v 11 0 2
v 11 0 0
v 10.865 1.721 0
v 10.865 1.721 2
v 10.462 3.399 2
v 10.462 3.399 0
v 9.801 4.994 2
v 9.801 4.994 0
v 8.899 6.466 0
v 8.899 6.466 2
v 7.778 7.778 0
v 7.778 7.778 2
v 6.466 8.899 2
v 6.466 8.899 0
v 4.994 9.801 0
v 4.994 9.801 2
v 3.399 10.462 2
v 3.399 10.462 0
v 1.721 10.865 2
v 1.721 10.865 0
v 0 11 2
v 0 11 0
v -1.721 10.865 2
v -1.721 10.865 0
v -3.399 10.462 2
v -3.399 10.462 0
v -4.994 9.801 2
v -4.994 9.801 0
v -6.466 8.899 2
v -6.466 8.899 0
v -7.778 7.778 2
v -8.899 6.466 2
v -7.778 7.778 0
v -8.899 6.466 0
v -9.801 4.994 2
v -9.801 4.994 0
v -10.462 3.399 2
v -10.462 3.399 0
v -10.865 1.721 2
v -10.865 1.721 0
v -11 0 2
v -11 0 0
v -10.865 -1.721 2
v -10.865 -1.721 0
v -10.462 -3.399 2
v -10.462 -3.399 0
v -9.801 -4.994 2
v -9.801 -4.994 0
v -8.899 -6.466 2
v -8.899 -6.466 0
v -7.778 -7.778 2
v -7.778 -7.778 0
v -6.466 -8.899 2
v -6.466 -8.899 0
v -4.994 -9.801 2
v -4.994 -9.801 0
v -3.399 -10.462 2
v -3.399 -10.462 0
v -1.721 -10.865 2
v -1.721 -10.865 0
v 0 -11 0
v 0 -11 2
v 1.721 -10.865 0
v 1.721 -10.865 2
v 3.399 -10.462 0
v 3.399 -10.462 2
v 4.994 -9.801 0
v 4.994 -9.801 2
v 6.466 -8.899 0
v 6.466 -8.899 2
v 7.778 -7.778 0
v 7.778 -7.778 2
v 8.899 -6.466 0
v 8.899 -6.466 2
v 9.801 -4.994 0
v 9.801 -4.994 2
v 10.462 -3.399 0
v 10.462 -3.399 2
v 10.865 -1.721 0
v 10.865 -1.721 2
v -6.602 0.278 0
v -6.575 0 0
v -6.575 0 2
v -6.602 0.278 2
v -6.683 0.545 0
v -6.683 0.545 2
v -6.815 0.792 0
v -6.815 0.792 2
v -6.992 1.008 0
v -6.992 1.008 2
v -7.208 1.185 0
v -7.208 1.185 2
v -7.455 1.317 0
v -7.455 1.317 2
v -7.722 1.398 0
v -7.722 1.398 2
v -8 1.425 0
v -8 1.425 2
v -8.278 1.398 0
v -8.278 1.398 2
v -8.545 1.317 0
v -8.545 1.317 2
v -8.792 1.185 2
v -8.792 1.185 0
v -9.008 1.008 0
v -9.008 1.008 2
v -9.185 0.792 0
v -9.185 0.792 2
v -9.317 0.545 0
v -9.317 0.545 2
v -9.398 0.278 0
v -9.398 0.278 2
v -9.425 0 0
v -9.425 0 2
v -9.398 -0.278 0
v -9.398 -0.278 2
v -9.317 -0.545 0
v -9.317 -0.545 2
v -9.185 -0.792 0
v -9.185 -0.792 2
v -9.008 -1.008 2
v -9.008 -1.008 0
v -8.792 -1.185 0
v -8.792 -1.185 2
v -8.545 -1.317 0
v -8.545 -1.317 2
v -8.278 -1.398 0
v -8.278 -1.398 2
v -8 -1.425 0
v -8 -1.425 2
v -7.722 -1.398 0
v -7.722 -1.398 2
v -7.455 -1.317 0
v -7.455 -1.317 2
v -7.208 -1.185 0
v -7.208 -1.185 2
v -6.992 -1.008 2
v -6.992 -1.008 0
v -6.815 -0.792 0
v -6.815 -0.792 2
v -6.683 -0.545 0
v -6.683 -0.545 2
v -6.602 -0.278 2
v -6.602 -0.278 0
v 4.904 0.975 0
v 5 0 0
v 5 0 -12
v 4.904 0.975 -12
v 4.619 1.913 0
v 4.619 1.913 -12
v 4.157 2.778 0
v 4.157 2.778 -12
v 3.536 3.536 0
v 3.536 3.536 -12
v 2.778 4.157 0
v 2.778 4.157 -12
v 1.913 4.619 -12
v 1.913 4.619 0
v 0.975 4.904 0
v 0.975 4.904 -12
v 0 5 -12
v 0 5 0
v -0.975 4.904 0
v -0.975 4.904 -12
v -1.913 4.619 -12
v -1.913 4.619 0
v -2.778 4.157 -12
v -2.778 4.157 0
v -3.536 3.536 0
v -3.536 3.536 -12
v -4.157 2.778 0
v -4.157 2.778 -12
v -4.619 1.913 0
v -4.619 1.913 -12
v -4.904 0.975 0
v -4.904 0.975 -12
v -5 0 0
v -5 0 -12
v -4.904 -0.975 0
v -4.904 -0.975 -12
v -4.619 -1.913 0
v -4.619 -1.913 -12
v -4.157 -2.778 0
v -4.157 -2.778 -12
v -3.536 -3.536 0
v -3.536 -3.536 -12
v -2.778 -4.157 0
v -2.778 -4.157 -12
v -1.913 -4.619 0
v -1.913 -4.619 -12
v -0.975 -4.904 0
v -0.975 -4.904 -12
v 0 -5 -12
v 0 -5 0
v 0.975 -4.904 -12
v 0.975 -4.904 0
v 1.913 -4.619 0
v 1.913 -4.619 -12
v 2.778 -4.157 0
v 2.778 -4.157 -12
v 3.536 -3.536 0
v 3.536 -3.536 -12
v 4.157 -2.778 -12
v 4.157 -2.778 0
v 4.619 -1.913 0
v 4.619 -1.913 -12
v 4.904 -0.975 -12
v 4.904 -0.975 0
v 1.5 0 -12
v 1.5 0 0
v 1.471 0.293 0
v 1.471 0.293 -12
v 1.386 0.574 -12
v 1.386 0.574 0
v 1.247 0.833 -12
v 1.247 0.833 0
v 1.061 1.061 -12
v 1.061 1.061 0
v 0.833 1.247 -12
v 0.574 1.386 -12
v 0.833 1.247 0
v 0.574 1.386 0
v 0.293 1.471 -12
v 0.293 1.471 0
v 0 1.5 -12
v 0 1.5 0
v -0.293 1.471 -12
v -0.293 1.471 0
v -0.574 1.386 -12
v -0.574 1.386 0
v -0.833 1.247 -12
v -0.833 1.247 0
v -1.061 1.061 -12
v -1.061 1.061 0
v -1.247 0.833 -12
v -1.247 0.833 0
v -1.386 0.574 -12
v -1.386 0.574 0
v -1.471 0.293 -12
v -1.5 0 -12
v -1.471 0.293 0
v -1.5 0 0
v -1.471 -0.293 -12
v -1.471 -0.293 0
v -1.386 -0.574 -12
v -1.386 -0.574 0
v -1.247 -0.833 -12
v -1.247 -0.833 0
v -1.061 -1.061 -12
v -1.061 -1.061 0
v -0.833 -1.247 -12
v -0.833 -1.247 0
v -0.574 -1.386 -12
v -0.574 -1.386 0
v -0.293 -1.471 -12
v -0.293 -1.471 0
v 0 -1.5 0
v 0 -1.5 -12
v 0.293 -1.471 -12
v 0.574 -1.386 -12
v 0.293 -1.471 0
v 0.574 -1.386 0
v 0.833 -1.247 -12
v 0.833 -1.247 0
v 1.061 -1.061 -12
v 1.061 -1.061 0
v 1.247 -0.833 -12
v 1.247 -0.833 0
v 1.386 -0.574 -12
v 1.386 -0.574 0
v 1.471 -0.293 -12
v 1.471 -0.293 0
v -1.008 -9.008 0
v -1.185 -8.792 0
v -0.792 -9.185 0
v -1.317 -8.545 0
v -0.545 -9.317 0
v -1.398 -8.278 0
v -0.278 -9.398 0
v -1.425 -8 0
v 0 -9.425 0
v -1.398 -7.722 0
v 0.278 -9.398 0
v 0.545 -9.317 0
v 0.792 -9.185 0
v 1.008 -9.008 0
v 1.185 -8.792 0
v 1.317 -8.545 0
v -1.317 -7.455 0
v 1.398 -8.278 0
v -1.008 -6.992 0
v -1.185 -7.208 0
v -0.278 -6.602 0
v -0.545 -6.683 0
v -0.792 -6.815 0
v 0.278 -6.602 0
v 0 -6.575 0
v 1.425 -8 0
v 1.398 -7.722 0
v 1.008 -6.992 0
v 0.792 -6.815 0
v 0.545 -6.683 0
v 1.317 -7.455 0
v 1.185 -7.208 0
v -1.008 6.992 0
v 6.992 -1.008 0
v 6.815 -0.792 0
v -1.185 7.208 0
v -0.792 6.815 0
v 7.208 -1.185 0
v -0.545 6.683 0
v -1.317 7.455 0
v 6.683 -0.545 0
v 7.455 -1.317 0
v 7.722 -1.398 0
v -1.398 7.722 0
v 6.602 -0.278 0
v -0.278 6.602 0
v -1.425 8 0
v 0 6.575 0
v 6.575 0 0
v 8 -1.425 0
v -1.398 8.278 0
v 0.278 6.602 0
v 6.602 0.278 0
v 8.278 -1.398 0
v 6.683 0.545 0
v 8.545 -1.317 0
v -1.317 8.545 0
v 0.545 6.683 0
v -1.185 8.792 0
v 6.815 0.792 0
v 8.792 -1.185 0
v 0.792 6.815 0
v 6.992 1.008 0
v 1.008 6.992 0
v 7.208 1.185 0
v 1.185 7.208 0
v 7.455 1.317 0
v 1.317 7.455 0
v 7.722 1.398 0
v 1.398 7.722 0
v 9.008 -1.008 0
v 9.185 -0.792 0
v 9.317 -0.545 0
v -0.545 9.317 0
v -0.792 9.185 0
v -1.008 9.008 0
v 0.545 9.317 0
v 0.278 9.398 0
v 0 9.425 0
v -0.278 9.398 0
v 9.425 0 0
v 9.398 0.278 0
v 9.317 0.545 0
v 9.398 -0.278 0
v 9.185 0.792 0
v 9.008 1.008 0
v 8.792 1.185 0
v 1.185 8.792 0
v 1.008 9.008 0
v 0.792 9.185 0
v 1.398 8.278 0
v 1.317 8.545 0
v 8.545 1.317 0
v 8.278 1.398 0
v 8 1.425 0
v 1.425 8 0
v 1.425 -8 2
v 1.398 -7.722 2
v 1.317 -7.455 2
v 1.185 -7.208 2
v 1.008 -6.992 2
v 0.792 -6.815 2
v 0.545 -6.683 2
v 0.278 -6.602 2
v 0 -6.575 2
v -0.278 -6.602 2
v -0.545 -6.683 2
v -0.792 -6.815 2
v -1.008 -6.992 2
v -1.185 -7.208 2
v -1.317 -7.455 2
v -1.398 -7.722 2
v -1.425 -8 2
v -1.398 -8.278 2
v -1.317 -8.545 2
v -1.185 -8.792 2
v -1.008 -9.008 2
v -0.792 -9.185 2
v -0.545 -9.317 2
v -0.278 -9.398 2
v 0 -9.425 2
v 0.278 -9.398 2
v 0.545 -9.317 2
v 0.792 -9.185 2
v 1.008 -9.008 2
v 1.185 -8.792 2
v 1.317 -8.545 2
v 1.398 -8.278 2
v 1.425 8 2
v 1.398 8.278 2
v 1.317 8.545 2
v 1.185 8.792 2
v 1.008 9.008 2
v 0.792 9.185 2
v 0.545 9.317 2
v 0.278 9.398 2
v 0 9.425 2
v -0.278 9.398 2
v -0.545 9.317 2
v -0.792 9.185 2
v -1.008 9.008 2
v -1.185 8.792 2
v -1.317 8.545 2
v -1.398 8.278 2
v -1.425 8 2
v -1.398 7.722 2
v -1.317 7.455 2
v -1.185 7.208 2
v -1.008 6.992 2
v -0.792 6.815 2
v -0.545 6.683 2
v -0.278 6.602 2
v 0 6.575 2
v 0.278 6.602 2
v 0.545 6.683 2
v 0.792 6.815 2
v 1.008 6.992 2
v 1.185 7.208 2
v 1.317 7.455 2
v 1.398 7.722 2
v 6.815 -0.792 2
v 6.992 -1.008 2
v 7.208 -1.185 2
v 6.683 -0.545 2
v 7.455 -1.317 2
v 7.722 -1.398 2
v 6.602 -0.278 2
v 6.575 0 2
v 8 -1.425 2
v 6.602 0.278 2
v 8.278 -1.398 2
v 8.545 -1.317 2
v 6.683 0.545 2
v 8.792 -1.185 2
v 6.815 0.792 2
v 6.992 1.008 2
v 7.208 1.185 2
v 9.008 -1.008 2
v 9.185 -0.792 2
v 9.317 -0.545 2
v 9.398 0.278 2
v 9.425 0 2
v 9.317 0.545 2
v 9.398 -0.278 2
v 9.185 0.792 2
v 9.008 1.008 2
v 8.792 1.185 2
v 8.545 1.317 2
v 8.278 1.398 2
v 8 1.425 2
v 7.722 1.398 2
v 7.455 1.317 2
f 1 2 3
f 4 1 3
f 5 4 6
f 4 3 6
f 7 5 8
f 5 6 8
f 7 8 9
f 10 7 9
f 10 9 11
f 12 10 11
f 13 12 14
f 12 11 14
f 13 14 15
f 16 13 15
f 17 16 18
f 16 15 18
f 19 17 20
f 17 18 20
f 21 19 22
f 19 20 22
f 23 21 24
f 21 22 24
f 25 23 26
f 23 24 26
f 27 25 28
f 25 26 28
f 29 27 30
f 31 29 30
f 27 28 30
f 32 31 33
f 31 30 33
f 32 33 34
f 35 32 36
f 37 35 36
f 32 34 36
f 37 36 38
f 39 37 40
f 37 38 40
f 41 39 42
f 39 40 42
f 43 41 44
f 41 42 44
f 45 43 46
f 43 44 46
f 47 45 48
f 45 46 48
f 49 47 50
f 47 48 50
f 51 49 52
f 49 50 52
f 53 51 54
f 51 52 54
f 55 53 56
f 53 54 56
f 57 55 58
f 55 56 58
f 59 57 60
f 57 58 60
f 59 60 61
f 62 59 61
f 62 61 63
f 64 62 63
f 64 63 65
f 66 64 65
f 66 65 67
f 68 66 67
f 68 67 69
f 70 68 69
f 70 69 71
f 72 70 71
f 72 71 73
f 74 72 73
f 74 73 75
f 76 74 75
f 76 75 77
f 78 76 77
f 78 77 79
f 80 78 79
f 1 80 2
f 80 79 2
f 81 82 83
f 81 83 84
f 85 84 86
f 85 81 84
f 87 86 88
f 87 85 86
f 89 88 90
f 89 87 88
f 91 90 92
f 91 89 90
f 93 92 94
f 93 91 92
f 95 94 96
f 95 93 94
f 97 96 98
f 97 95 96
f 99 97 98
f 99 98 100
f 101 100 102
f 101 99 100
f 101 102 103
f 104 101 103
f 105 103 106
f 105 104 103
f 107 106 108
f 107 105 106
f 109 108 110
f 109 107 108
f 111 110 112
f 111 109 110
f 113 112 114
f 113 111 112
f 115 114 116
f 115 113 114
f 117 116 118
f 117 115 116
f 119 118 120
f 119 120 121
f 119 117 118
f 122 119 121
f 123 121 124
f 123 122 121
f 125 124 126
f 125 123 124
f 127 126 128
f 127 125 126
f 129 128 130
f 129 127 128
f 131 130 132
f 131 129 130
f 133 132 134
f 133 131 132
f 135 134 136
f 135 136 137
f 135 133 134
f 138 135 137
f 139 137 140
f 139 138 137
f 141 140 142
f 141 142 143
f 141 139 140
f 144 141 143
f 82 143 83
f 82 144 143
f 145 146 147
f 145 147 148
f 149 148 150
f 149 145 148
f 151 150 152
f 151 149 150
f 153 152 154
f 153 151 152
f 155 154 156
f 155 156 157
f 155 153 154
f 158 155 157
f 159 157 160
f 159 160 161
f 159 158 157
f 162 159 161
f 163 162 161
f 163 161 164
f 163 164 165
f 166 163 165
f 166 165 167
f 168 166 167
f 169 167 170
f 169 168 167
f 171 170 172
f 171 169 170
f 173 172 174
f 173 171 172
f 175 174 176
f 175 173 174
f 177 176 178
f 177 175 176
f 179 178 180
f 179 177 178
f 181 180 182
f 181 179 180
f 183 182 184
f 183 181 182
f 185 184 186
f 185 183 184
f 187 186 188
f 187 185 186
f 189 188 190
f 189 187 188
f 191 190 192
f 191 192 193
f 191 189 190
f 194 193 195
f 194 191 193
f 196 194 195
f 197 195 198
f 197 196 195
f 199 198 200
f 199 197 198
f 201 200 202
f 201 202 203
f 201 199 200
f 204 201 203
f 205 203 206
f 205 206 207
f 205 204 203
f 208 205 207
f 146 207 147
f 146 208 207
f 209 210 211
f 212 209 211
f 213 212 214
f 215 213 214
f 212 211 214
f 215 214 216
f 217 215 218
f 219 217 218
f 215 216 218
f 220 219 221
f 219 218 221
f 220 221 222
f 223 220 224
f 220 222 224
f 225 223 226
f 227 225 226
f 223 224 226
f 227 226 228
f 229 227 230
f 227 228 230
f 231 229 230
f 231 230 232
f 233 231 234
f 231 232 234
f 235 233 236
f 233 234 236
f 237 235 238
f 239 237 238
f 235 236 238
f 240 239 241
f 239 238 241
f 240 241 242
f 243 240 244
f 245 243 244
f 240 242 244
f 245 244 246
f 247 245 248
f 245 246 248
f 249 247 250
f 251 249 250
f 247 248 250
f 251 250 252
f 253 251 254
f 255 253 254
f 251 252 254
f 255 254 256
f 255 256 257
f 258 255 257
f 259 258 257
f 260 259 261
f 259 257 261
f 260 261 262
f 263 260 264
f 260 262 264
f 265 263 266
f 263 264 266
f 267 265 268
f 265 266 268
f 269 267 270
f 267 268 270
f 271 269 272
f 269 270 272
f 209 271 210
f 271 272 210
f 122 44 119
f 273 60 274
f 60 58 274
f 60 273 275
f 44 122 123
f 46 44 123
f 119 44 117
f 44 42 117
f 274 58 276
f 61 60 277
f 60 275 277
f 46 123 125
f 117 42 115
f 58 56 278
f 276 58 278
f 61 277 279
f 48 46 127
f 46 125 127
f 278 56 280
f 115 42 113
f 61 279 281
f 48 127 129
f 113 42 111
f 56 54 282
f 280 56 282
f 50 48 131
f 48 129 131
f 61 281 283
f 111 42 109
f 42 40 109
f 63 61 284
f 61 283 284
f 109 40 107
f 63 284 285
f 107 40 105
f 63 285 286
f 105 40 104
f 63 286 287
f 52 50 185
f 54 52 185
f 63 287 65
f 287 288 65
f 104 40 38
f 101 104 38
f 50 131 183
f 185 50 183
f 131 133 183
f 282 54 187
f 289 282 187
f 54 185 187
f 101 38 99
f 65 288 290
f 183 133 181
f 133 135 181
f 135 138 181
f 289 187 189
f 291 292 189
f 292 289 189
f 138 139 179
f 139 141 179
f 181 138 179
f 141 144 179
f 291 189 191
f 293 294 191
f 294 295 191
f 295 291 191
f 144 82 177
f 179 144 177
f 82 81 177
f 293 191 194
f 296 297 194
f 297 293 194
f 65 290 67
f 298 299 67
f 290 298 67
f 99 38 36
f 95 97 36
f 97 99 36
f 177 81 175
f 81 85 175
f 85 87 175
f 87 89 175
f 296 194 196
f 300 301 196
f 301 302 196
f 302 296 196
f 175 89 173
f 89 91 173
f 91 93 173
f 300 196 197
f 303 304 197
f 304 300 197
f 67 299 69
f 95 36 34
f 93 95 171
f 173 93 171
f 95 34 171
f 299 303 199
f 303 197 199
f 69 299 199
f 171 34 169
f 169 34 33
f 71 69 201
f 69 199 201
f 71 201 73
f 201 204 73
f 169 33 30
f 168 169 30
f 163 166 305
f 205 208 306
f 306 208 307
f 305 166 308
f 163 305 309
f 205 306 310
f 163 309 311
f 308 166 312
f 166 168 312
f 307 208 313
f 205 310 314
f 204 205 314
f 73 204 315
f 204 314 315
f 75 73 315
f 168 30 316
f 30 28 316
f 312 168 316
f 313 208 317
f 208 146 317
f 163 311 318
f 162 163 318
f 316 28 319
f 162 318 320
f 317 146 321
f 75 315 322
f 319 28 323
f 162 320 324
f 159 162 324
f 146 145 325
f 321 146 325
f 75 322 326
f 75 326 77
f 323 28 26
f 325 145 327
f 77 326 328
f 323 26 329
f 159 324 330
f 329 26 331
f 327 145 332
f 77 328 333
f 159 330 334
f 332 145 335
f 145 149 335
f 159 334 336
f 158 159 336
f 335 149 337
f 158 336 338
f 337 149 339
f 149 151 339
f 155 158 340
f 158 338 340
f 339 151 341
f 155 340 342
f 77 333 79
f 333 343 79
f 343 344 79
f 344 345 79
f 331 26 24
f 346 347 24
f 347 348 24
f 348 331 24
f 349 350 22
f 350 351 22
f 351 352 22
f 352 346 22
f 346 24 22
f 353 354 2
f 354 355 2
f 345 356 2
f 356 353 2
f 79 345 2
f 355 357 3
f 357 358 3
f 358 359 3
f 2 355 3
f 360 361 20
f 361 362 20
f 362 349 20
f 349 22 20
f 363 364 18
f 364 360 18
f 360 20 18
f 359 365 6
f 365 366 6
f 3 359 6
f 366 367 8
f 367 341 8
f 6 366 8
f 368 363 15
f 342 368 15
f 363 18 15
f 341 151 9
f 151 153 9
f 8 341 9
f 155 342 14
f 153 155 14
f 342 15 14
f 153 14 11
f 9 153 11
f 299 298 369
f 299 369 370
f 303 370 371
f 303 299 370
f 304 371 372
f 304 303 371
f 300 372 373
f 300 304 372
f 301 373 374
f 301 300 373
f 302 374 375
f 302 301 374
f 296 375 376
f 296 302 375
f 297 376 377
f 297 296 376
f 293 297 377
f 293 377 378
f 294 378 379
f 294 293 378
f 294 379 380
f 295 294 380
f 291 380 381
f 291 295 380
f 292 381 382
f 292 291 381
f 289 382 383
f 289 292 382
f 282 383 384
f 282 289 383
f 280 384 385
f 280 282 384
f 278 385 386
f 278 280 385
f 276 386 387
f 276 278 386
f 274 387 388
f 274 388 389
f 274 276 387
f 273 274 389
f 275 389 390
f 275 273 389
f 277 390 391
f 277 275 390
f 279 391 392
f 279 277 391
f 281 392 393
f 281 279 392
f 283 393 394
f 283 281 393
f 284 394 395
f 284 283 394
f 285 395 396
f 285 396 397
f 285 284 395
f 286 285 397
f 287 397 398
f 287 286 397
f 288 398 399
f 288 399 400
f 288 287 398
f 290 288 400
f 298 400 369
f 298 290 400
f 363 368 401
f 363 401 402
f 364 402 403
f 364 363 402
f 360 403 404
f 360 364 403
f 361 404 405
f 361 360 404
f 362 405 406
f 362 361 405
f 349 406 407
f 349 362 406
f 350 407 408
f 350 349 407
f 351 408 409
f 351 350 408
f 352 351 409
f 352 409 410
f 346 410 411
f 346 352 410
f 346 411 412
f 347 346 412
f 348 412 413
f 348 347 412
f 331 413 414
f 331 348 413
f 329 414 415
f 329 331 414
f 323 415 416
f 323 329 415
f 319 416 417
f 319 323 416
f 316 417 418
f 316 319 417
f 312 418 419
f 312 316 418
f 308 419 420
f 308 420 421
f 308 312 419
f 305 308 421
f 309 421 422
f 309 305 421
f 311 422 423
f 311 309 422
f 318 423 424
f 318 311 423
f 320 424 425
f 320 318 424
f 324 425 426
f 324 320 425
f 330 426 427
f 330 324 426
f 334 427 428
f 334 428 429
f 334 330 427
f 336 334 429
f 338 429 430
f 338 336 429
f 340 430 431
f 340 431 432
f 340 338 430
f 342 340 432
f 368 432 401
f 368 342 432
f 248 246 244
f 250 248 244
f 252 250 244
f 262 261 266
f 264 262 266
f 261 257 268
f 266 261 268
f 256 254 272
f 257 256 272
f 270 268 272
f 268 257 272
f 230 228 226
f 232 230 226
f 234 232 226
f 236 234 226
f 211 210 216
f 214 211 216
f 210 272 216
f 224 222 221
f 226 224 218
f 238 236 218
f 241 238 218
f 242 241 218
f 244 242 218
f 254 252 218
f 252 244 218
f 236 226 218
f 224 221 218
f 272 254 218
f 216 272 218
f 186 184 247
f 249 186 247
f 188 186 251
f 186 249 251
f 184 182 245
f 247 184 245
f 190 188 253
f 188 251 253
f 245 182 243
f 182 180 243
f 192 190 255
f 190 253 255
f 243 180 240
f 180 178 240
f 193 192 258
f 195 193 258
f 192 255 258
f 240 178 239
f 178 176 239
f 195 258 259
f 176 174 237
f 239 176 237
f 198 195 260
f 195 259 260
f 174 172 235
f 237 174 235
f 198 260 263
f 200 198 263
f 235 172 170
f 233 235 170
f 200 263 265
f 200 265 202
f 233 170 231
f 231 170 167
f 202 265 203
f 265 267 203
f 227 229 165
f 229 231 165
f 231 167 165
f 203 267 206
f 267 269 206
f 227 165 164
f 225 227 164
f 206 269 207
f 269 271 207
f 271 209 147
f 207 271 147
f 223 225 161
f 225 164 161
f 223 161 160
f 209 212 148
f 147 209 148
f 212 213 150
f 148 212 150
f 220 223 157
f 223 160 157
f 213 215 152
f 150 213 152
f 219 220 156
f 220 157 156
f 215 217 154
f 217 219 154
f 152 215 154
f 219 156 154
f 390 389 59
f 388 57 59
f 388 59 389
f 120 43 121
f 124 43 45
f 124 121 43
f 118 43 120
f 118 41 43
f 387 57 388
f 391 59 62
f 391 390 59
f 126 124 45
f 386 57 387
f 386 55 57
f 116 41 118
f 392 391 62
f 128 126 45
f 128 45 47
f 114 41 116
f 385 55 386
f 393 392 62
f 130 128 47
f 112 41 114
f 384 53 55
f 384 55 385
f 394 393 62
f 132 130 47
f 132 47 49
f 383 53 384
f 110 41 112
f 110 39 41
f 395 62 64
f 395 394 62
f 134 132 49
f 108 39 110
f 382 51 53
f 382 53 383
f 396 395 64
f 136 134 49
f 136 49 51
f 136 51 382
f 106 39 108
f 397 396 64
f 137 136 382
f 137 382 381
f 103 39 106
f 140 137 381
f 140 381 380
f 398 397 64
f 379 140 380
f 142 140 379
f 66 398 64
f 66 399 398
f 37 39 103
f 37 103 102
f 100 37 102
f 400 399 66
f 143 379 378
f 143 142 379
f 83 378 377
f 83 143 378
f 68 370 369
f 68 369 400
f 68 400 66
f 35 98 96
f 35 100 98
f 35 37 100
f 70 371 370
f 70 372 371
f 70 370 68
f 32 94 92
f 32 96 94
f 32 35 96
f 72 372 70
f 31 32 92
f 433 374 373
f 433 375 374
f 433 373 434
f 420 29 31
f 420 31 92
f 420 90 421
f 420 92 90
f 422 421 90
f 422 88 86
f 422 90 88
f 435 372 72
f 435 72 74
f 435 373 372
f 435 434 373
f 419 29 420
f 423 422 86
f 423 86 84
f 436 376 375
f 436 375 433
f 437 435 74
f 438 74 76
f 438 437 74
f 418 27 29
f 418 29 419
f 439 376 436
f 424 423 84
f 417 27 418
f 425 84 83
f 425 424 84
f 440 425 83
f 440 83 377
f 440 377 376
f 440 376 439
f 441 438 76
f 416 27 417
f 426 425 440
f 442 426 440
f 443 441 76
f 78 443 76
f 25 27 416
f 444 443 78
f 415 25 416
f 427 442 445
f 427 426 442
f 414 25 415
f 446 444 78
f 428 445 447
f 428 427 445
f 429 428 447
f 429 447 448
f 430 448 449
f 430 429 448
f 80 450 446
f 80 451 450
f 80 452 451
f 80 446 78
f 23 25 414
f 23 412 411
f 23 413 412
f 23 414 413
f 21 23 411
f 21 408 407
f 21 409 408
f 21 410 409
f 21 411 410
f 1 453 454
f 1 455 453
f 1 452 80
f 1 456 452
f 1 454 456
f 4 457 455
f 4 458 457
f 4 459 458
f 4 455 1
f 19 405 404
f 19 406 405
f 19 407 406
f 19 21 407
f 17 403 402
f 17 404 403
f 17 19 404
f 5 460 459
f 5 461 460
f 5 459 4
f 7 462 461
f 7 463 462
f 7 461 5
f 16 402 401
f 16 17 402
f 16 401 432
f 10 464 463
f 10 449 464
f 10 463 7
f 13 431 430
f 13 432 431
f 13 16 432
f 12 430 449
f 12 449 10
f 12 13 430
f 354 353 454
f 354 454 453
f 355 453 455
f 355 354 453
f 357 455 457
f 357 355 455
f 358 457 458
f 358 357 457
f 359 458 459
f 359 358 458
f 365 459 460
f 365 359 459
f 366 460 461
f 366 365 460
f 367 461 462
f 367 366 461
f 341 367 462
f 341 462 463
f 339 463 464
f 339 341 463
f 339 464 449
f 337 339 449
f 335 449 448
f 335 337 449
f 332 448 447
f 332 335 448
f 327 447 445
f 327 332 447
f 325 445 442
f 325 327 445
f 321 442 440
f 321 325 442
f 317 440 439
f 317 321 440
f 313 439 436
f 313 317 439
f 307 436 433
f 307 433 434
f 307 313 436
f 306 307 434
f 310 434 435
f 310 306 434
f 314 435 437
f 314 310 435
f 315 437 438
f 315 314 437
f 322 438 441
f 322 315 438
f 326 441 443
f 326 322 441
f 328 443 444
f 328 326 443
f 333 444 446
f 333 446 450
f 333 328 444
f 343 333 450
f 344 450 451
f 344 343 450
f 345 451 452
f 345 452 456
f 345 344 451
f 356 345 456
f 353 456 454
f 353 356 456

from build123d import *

# Parameters (mm, degrees)
SKETCH1_R           = 11
SKETCH1_R_2         = 1.425
BOSS_EXTRUDE1_DEPTH = 2
SKETCH1_4_R         = 5
SKETCH1_4_R_2       = 1.5
BOSS_EXTRUDE2_DEPTH = 12


with BuildPart() as part:
    # Sketch1 → Boss-Extrude1 (new body)
    with BuildSketch(Plane.XY):
        Circle(SKETCH1_R)
        with Locations((0, 8)):
            Circle(SKETCH1_R_2, mode=Mode.SUBTRACT)
        with Locations((8, 0)):
            Circle(SKETCH1_R_2, mode=Mode.SUBTRACT)
        with Locations((0, -8)):
            Circle(SKETCH1_R_2, mode=Mode.SUBTRACT)
        with Locations((-8, 0)):
            Circle(SKETCH1_R_2, mode=Mode.SUBTRACT)
    extrude(amount=BOSS_EXTRUDE1_DEPTH)

    # Sketch1<4> → Boss-Extrude2 (add)
    with BuildSketch(Plane.XY):
        Circle(SKETCH1_4_R)
        Circle(SKETCH1_4_R_2, mode=Mode.SUBTRACT)
    extrude(amount=-BOSS_EXTRUDE2_DEPTH)


solid = part.part
